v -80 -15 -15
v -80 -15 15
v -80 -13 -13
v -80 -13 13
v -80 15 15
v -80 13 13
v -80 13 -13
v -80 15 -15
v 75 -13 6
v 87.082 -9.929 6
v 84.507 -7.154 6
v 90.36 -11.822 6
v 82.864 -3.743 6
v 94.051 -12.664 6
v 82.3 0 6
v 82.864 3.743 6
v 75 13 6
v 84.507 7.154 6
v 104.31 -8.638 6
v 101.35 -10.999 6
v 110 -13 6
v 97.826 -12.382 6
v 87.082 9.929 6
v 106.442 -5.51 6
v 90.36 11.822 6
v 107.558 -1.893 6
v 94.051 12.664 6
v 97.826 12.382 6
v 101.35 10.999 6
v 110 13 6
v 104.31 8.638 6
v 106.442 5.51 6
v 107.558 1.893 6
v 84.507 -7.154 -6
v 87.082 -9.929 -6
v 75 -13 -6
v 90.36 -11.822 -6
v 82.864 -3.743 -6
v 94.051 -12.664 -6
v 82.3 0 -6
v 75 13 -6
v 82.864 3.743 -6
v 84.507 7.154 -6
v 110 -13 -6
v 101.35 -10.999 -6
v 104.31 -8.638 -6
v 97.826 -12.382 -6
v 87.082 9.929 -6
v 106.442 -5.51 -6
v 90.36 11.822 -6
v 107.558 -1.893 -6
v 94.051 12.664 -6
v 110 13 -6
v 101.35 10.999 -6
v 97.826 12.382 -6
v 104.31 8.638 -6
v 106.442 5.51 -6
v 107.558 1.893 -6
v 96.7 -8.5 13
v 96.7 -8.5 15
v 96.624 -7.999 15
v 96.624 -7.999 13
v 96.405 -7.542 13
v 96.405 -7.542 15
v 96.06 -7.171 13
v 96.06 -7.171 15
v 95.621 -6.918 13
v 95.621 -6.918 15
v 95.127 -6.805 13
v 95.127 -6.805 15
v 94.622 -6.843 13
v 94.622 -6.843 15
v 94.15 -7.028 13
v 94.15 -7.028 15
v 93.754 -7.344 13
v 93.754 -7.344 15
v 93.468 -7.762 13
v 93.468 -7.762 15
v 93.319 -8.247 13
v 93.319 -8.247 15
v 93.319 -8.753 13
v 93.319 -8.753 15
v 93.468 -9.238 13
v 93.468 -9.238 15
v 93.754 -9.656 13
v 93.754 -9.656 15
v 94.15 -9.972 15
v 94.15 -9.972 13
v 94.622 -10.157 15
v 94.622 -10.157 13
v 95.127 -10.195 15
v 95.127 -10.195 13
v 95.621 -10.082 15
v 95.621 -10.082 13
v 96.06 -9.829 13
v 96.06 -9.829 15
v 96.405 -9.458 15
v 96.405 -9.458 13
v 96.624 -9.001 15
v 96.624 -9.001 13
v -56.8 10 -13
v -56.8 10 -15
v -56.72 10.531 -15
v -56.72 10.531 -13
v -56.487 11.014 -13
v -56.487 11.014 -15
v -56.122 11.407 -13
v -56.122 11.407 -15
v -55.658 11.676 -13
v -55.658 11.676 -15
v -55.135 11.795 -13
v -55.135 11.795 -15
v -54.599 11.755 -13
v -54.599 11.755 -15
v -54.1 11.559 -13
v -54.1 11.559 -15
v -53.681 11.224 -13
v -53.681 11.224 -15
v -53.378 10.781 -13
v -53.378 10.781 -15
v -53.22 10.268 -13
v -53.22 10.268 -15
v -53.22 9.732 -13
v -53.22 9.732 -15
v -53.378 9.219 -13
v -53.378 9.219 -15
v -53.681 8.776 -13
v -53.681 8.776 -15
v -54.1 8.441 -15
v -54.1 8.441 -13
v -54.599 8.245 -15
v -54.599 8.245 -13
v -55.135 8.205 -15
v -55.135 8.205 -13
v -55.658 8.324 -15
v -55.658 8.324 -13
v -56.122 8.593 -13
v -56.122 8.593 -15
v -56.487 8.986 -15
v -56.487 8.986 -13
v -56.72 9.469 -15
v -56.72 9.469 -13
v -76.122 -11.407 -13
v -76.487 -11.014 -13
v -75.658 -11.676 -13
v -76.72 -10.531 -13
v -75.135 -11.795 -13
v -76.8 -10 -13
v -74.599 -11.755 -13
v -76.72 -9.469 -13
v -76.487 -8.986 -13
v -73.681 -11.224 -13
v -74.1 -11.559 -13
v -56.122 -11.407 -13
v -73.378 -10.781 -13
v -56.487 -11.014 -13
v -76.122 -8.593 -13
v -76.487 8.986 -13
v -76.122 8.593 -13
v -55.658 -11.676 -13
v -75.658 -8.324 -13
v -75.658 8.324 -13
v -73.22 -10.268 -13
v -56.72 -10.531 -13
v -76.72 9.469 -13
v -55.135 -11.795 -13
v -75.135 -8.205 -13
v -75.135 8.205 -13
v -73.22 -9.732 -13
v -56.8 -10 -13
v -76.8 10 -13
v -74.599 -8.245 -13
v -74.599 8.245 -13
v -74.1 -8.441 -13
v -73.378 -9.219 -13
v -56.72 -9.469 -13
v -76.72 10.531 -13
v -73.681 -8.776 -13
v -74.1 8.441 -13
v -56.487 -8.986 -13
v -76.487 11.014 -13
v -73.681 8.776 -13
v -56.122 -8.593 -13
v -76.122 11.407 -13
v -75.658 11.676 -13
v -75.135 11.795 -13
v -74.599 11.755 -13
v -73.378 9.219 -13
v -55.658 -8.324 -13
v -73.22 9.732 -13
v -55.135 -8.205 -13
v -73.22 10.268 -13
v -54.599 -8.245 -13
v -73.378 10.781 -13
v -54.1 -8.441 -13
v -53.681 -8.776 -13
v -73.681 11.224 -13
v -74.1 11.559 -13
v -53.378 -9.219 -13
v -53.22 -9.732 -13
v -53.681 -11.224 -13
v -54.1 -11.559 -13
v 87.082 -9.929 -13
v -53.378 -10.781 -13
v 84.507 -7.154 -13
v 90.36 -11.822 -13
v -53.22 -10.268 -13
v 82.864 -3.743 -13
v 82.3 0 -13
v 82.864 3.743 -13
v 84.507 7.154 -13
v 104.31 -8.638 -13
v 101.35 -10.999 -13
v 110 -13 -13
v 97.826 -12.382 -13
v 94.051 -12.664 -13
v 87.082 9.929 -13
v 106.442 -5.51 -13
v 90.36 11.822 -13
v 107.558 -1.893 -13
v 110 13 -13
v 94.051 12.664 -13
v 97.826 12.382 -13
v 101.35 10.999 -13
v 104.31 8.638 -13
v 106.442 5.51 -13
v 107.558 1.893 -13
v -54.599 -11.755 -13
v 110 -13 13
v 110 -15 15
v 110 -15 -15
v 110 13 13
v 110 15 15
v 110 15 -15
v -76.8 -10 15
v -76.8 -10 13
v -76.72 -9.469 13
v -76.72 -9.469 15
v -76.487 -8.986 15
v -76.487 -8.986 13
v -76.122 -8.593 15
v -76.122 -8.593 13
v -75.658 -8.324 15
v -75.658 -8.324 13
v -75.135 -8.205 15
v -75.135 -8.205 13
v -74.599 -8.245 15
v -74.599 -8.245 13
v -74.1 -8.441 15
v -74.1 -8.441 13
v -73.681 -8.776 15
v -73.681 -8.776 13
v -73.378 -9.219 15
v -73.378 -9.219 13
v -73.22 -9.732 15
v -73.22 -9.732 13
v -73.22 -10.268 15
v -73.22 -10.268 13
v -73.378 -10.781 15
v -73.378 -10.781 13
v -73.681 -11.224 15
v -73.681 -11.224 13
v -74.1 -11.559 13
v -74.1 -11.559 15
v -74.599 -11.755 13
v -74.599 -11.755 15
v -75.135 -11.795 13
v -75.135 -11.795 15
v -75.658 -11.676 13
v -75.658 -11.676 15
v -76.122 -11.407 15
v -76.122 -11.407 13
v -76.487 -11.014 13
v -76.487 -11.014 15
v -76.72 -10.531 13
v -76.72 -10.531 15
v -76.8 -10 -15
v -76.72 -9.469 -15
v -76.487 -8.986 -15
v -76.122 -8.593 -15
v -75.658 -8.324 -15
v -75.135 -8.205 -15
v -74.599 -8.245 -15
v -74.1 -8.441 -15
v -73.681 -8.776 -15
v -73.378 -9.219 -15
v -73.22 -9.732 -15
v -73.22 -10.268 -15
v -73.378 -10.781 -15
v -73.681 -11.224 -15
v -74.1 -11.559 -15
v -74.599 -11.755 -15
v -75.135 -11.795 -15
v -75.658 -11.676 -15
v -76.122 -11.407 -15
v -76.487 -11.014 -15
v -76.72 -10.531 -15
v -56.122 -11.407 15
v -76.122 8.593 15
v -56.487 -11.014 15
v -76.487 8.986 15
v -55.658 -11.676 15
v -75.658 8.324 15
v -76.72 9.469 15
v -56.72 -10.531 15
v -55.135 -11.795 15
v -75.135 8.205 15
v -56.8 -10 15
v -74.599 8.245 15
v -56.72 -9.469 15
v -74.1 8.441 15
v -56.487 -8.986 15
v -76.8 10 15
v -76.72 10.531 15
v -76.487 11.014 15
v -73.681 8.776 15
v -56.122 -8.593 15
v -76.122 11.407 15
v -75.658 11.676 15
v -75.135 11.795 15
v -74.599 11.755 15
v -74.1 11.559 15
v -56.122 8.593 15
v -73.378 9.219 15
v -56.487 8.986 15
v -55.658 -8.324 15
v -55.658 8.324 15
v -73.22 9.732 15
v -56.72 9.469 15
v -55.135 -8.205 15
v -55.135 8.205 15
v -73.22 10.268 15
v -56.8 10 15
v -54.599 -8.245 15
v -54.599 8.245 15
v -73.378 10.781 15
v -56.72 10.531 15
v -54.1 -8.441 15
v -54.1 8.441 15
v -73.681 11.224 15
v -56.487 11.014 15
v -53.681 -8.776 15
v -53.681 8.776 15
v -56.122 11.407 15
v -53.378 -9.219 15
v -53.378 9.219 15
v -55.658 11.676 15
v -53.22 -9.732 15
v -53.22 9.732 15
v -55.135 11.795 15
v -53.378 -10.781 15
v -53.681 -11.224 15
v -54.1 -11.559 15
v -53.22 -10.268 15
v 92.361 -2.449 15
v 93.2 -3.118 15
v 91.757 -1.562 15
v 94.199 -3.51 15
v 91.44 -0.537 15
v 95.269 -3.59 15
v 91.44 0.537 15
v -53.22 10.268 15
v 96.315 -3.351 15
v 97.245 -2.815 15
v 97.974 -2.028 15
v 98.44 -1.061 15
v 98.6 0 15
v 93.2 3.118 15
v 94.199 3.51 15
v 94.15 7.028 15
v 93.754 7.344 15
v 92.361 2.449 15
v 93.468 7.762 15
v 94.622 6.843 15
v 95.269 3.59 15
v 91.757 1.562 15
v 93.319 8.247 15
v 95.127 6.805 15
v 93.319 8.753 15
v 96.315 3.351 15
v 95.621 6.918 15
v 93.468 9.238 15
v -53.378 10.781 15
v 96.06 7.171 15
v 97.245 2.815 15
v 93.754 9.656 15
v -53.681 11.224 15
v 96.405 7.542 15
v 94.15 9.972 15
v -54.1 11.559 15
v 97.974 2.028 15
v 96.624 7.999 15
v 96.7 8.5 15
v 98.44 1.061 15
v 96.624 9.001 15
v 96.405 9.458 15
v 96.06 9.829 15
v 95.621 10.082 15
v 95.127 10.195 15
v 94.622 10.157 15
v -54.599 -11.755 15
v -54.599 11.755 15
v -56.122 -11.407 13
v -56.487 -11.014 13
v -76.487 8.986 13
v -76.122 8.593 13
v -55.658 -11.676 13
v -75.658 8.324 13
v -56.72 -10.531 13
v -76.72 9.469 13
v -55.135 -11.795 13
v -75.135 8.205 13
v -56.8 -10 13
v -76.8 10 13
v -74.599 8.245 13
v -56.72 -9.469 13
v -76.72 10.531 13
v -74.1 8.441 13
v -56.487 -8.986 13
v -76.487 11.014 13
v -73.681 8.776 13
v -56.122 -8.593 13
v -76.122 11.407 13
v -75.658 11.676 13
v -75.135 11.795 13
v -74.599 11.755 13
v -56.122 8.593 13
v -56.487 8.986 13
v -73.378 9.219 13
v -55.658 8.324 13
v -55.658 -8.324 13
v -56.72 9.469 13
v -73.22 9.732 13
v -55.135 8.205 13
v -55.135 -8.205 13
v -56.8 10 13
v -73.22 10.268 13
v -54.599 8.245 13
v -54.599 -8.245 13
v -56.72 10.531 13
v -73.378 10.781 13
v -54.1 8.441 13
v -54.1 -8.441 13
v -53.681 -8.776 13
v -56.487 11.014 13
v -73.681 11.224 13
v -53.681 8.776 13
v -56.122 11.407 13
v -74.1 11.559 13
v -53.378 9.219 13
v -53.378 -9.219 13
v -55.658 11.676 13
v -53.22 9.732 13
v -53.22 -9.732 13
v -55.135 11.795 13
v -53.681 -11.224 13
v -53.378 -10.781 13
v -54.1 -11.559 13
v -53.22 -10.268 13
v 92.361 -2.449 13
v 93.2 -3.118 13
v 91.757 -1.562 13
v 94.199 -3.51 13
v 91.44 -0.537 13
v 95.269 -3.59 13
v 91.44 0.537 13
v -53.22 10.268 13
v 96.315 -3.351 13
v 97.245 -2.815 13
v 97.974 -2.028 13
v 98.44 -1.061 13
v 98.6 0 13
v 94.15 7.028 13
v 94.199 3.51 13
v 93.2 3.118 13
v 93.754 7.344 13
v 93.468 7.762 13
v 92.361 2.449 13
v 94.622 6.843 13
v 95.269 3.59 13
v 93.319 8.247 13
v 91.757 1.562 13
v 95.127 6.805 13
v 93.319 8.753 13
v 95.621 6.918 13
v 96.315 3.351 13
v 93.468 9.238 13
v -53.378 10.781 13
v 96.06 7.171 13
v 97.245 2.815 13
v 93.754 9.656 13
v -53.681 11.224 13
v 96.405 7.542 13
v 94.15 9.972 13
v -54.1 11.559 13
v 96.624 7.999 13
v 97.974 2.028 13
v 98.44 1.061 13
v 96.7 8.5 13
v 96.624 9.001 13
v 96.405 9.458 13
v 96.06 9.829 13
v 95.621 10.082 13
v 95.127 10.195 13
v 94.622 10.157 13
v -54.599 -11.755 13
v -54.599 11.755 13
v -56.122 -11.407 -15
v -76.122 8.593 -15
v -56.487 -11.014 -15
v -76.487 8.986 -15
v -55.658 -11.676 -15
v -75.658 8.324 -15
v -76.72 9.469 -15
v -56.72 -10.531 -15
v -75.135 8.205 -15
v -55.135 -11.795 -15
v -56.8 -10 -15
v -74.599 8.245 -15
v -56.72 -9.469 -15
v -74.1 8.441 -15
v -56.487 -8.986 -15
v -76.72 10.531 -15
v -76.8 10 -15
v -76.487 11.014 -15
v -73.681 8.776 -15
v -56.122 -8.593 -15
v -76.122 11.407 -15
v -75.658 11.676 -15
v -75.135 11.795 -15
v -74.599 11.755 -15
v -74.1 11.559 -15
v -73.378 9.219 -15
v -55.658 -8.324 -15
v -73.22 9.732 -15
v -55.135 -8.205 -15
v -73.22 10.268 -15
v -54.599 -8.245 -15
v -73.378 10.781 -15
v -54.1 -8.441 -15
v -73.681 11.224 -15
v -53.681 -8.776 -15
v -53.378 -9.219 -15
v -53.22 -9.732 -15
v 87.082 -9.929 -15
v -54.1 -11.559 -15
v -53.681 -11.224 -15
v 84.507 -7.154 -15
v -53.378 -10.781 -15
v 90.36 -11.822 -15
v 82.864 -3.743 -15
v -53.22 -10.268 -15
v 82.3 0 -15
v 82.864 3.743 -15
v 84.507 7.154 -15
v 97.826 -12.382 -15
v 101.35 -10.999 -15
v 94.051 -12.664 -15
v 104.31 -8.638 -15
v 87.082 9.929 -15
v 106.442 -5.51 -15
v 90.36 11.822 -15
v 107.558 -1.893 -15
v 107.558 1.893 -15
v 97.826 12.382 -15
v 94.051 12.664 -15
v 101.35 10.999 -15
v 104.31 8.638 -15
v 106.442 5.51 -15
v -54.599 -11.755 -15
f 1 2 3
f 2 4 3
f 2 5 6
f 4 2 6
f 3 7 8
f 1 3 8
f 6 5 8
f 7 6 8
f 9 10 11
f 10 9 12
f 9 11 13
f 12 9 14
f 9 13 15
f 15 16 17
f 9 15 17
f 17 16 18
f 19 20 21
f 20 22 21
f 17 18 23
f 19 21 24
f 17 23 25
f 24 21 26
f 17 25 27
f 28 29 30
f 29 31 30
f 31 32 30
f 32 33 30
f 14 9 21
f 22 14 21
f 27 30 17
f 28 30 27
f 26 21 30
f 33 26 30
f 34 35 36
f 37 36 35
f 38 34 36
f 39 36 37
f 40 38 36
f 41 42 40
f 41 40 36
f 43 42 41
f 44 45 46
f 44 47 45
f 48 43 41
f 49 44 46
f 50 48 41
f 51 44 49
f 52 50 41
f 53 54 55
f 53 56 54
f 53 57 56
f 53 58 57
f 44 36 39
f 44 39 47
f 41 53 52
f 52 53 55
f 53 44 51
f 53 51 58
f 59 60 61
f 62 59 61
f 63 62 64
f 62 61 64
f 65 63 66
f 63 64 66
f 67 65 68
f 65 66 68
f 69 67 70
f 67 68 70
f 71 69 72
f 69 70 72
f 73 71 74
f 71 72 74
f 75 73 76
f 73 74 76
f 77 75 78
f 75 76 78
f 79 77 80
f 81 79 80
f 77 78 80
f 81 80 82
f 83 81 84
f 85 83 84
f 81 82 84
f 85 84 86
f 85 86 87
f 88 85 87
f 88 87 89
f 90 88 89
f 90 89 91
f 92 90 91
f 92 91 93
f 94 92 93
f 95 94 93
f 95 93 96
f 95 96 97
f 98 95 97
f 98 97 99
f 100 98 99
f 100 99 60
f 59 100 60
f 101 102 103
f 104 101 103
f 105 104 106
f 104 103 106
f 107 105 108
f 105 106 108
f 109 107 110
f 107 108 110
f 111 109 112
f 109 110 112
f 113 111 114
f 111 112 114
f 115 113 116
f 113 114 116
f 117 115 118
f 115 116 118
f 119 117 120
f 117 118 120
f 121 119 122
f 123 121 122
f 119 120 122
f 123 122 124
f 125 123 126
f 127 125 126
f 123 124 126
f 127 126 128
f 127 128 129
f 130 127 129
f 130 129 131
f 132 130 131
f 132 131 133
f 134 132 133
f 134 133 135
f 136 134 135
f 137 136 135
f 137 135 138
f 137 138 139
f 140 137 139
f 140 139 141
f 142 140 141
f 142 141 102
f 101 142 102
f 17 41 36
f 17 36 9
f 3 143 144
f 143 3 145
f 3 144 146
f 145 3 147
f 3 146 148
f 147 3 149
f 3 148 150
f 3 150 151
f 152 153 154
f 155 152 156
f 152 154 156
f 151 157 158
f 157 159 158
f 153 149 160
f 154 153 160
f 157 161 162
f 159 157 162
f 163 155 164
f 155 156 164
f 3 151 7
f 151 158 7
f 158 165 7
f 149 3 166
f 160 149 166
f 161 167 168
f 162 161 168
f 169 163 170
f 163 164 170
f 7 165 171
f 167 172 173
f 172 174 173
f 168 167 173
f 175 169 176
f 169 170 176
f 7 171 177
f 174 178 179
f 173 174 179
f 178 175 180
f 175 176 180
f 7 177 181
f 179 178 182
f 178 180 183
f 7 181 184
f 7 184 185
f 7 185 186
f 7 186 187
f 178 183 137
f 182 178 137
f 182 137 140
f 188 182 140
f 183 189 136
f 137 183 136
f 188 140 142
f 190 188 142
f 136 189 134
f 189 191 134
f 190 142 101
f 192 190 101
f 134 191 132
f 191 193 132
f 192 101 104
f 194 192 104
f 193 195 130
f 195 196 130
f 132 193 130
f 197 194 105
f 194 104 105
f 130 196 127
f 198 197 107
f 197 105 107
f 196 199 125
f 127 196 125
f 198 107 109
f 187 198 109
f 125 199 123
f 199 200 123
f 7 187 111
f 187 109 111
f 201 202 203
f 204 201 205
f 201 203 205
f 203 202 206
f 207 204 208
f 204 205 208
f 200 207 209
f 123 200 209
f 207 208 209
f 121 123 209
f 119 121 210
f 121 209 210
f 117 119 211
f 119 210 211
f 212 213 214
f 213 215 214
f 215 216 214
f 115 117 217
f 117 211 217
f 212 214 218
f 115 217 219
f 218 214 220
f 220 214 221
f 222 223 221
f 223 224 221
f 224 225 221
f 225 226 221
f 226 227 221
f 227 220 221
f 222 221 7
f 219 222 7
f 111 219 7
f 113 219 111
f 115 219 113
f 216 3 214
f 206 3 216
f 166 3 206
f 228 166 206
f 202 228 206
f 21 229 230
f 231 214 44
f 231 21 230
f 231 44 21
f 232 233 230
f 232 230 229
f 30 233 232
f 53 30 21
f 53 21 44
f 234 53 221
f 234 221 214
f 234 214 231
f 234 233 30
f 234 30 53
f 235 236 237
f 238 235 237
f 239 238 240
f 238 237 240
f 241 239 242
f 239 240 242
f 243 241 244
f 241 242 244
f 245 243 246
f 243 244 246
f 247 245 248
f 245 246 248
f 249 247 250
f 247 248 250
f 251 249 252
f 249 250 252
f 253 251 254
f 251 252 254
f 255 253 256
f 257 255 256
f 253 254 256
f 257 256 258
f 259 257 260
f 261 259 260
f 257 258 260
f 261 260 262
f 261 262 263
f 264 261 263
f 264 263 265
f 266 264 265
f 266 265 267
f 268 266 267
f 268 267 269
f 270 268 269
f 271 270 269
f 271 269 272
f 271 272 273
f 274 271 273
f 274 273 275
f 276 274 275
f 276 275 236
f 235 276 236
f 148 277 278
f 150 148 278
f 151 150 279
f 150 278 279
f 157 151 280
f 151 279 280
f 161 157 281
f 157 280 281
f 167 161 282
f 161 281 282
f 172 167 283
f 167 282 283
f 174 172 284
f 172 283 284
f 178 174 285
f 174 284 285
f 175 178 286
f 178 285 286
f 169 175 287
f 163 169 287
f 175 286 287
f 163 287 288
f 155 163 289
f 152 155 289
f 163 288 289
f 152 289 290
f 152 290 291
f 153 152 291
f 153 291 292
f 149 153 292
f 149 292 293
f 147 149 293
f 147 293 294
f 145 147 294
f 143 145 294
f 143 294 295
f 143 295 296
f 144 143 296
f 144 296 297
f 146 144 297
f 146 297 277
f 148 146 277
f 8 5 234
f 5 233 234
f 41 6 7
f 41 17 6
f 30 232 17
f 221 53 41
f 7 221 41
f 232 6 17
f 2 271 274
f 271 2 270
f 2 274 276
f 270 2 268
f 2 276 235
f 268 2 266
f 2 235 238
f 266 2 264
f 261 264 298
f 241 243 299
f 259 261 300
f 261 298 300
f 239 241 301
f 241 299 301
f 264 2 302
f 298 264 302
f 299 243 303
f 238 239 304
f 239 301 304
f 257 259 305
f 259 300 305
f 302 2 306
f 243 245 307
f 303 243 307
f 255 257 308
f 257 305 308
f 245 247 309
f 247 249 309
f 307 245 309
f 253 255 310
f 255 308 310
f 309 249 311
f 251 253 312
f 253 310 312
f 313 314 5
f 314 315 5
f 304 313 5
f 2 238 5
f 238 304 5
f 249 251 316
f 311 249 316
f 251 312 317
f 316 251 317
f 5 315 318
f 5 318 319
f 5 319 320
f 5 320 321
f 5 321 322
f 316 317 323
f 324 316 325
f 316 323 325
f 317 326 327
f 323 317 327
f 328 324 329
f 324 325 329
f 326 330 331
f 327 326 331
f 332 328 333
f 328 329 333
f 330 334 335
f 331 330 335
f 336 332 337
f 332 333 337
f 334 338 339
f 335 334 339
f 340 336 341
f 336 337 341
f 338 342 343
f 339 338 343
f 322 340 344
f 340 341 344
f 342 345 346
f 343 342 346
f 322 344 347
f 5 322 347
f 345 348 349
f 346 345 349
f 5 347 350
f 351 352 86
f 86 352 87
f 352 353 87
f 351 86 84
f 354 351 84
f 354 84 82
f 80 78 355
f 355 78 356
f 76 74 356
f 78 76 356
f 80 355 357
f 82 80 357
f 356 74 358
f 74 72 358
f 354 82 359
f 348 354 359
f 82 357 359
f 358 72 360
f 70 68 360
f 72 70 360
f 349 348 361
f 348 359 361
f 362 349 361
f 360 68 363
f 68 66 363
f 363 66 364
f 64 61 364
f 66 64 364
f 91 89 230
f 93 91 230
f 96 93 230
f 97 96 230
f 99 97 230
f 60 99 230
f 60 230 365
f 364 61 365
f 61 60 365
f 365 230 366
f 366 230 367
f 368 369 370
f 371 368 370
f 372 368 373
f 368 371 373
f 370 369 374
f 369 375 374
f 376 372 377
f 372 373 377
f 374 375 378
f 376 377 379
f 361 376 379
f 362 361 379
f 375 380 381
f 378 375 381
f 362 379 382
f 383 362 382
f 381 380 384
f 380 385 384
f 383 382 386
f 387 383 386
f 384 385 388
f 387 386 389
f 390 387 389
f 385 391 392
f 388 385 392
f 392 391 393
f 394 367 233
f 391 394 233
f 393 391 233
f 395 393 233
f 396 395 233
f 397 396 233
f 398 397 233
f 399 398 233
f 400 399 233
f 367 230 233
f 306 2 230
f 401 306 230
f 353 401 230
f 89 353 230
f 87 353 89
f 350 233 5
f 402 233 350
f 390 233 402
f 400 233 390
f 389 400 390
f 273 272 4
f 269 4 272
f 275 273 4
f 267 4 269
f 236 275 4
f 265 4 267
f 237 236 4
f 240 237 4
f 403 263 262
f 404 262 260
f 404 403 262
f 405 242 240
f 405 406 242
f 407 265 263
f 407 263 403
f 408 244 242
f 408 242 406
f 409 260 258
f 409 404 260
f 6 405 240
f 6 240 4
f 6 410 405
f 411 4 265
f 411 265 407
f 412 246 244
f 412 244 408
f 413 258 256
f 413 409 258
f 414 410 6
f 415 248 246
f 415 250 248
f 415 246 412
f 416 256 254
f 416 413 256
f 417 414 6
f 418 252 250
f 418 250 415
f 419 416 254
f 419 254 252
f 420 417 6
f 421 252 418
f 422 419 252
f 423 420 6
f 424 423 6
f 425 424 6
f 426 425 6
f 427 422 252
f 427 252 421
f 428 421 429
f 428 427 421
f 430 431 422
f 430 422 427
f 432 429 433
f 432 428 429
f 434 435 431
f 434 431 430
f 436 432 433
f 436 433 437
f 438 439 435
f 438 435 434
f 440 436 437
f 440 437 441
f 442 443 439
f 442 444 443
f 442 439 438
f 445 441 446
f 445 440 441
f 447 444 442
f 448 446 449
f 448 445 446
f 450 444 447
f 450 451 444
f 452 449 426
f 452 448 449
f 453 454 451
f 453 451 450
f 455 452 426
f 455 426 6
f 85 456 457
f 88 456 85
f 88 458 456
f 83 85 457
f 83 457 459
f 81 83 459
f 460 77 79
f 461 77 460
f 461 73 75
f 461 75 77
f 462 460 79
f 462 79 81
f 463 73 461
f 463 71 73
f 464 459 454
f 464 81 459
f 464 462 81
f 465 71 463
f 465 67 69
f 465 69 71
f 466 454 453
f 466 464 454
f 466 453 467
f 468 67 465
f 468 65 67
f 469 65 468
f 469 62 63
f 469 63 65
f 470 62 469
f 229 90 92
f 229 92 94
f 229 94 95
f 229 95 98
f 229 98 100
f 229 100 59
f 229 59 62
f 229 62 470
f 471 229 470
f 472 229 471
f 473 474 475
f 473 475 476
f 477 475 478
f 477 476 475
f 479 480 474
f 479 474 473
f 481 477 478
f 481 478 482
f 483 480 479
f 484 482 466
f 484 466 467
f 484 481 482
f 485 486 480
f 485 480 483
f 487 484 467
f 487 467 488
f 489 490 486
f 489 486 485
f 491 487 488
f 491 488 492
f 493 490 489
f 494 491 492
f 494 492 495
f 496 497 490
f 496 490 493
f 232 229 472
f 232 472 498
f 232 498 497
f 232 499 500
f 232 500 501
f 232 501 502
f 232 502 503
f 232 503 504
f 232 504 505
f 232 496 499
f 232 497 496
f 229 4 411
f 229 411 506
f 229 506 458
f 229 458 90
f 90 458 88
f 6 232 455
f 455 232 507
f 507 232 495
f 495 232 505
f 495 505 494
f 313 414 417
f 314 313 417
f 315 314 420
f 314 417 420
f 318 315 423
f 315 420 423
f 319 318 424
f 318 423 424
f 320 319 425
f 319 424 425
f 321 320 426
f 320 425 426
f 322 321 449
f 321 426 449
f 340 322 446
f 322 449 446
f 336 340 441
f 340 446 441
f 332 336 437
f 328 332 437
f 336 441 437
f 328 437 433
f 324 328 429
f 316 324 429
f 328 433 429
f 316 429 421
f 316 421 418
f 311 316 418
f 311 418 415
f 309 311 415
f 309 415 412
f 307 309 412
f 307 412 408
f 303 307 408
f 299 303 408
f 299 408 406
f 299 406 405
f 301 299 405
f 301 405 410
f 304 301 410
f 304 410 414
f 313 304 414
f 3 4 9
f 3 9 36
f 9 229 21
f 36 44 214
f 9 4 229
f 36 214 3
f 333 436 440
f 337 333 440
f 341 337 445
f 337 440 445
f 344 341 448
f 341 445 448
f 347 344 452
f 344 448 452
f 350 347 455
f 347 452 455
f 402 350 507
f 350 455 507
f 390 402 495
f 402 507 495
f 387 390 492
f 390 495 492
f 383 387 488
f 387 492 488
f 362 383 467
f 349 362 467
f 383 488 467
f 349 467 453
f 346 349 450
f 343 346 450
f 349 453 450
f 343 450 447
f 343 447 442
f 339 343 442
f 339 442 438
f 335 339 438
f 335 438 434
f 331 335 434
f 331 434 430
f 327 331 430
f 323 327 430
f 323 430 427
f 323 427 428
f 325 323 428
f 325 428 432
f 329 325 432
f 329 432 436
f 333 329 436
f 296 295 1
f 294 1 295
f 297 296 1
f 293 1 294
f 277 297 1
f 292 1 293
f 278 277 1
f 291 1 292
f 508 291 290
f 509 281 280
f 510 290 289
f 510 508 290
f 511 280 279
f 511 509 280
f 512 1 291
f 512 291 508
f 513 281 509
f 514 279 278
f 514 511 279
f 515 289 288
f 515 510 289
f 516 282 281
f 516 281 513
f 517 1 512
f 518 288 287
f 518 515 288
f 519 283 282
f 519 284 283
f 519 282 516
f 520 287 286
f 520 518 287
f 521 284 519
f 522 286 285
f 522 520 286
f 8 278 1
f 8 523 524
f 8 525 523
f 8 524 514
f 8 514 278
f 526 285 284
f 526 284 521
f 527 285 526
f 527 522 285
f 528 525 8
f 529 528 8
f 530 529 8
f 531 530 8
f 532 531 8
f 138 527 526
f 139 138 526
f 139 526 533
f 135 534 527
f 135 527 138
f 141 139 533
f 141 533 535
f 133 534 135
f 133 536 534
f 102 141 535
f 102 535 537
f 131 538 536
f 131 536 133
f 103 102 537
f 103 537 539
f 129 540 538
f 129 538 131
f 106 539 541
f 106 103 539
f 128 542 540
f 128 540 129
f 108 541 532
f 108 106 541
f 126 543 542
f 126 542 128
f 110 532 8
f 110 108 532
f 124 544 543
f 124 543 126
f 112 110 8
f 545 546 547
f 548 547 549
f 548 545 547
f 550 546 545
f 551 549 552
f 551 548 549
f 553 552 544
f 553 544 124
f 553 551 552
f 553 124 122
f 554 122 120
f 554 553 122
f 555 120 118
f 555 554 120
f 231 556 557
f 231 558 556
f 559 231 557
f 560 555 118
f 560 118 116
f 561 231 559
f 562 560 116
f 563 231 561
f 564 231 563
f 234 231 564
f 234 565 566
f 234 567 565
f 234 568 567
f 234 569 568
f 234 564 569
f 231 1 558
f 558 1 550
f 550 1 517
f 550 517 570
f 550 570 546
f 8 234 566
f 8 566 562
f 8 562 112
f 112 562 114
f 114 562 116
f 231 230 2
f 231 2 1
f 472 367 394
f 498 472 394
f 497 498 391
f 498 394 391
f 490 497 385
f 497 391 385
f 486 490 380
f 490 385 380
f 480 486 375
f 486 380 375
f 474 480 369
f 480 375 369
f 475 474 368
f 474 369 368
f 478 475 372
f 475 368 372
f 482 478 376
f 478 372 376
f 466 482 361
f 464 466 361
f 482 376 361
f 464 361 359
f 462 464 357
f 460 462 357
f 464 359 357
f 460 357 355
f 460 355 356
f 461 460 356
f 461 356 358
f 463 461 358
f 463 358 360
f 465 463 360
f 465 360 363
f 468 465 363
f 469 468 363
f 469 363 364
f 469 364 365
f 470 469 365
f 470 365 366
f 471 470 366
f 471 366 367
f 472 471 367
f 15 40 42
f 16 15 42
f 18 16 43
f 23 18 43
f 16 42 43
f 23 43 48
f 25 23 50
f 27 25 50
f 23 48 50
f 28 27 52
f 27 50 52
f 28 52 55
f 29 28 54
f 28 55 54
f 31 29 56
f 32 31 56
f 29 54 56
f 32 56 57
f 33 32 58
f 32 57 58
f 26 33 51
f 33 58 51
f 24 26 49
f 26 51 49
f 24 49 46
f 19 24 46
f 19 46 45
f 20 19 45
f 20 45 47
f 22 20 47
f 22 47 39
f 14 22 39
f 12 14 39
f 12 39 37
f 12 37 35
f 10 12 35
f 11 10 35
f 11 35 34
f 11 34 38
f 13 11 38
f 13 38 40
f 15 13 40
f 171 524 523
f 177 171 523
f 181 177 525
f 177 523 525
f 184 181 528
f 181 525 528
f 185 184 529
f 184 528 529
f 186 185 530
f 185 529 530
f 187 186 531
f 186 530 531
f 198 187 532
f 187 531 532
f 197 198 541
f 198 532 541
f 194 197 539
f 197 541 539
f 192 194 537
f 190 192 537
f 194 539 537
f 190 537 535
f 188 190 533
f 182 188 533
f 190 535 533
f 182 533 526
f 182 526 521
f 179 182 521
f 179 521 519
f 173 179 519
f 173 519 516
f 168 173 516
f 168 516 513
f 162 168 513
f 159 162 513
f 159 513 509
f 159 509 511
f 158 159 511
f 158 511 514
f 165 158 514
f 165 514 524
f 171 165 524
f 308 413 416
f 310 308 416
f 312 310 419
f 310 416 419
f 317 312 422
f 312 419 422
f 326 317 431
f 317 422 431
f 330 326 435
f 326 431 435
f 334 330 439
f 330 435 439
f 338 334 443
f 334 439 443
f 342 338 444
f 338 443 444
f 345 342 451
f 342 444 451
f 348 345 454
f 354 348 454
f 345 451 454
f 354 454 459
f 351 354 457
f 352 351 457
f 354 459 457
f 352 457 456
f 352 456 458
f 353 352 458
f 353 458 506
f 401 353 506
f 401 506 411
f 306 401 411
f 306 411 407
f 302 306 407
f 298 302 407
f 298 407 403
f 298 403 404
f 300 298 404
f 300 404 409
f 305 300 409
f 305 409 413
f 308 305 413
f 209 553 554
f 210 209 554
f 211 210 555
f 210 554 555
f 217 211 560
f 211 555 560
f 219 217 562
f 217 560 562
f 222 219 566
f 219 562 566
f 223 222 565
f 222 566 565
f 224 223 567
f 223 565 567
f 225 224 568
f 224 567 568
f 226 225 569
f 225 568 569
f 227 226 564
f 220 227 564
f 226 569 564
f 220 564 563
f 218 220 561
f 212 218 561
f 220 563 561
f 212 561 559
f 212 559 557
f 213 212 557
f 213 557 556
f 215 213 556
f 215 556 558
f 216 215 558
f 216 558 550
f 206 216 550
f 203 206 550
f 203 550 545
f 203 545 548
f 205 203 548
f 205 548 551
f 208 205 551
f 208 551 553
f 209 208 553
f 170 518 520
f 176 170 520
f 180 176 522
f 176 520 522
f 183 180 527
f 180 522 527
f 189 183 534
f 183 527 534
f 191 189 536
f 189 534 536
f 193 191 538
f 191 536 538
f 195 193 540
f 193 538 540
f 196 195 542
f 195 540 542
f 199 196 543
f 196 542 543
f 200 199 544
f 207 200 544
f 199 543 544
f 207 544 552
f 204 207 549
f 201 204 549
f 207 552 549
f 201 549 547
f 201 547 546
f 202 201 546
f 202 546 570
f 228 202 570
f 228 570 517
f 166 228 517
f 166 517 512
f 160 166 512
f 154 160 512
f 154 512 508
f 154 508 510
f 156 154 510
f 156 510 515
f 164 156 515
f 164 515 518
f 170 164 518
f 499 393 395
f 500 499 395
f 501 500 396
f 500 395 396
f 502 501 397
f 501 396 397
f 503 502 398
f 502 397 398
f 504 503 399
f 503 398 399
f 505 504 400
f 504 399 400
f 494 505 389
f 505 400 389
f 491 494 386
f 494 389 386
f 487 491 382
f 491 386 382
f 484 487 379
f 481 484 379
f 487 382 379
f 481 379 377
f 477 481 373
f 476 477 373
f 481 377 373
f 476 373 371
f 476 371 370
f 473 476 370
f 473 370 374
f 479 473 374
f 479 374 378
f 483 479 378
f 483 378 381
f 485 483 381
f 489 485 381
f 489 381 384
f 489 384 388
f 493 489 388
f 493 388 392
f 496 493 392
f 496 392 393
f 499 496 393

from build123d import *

# Parameters (mm, degrees)
SKETCH1_W                = 30
SKETCH1_H                = 30
SKETCH1_W_2              = 7
SKETCH1_H_2              = 26
BOSS_EXTRUDE3_DEPTH      = 110
BOSS_EXTRUDE3_DEPTH_BACK = 80
SKETCH6_R                = 12.7
CUT_EXTRUDE5_DEPTH       = 23
SKETCH8_R                = 3.6
SKETCH8_R_2              = 1.7
CUT_EXTRUDE6_DEPTH       = 17
SKETCH9_W                = 12
SKETCH9_H                = 26
CUT_EXTRUDE7_DEPTH       = 155
M3_CLEARANCE_HOLE1_D     = 3.6


with BuildPart() as part:
    # Sketch1 → Boss-Extrude3 (new body, two sides)
    with BuildSketch(Plane(origin=(0, 0, 0), x_dir=(0, 0, -1), z_dir=(1, 0, 0))) as boss_extrude3_sk:
        Rectangle(SKETCH1_W, SKETCH1_H)
        with Locations((-9.5, 0)):
            Rectangle(SKETCH1_W_2, SKETCH1_H_2, mode=Mode.SUBTRACT)
        with Locations((9.5, 0)):
            Rectangle(SKETCH1_W_2, SKETCH1_H_2, mode=Mode.SUBTRACT)
    extrude(amount=BOSS_EXTRUDE3_DEPTH)
    extrude(boss_extrude3_sk.sketch, amount=-BOSS_EXTRUDE3_DEPTH_BACK)

    # Sketch6 → Cut-Extrude5 (cut)
    with BuildSketch(Plane(origin=(0, 0, -15), x_dir=(-1, 0, 0), z_dir=(0, 0, -1))):
        with Locations((-95, 0)):
            Circle(SKETCH6_R)
    extrude(amount=-CUT_EXTRUDE5_DEPTH, mode=Mode.SUBTRACT)

    # Sketch8 → Cut-Extrude6 (cut)
    with BuildSketch(Plane.XY.offset(15)):
        with Locations((95, 0)):
            Circle(SKETCH8_R)
        with Locations((95, 8.5)):
            Circle(SKETCH8_R_2)
        with Locations((95, -8.5)):
            Circle(SKETCH8_R_2)
    extrude(amount=-CUT_EXTRUDE6_DEPTH, mode=Mode.SUBTRACT)

    # Sketch9 → Cut-Extrude7 (cut)
    with BuildSketch(Plane.ZY.offset(80)):
        Rectangle(SKETCH9_W, SKETCH9_H)
    extrude(amount=-CUT_EXTRUDE7_DEPTH, mode=Mode.SUBTRACT)

    # M3 Clearance Hole1 (through all)
    with Locations(Plane.XY.offset(15)):
        with Locations((-75, 10), (-75, -10), (-55, -10), (-55, 10)):
            Hole(M3_CLEARANCE_HOLE1_D / 2)


solid = part.part
